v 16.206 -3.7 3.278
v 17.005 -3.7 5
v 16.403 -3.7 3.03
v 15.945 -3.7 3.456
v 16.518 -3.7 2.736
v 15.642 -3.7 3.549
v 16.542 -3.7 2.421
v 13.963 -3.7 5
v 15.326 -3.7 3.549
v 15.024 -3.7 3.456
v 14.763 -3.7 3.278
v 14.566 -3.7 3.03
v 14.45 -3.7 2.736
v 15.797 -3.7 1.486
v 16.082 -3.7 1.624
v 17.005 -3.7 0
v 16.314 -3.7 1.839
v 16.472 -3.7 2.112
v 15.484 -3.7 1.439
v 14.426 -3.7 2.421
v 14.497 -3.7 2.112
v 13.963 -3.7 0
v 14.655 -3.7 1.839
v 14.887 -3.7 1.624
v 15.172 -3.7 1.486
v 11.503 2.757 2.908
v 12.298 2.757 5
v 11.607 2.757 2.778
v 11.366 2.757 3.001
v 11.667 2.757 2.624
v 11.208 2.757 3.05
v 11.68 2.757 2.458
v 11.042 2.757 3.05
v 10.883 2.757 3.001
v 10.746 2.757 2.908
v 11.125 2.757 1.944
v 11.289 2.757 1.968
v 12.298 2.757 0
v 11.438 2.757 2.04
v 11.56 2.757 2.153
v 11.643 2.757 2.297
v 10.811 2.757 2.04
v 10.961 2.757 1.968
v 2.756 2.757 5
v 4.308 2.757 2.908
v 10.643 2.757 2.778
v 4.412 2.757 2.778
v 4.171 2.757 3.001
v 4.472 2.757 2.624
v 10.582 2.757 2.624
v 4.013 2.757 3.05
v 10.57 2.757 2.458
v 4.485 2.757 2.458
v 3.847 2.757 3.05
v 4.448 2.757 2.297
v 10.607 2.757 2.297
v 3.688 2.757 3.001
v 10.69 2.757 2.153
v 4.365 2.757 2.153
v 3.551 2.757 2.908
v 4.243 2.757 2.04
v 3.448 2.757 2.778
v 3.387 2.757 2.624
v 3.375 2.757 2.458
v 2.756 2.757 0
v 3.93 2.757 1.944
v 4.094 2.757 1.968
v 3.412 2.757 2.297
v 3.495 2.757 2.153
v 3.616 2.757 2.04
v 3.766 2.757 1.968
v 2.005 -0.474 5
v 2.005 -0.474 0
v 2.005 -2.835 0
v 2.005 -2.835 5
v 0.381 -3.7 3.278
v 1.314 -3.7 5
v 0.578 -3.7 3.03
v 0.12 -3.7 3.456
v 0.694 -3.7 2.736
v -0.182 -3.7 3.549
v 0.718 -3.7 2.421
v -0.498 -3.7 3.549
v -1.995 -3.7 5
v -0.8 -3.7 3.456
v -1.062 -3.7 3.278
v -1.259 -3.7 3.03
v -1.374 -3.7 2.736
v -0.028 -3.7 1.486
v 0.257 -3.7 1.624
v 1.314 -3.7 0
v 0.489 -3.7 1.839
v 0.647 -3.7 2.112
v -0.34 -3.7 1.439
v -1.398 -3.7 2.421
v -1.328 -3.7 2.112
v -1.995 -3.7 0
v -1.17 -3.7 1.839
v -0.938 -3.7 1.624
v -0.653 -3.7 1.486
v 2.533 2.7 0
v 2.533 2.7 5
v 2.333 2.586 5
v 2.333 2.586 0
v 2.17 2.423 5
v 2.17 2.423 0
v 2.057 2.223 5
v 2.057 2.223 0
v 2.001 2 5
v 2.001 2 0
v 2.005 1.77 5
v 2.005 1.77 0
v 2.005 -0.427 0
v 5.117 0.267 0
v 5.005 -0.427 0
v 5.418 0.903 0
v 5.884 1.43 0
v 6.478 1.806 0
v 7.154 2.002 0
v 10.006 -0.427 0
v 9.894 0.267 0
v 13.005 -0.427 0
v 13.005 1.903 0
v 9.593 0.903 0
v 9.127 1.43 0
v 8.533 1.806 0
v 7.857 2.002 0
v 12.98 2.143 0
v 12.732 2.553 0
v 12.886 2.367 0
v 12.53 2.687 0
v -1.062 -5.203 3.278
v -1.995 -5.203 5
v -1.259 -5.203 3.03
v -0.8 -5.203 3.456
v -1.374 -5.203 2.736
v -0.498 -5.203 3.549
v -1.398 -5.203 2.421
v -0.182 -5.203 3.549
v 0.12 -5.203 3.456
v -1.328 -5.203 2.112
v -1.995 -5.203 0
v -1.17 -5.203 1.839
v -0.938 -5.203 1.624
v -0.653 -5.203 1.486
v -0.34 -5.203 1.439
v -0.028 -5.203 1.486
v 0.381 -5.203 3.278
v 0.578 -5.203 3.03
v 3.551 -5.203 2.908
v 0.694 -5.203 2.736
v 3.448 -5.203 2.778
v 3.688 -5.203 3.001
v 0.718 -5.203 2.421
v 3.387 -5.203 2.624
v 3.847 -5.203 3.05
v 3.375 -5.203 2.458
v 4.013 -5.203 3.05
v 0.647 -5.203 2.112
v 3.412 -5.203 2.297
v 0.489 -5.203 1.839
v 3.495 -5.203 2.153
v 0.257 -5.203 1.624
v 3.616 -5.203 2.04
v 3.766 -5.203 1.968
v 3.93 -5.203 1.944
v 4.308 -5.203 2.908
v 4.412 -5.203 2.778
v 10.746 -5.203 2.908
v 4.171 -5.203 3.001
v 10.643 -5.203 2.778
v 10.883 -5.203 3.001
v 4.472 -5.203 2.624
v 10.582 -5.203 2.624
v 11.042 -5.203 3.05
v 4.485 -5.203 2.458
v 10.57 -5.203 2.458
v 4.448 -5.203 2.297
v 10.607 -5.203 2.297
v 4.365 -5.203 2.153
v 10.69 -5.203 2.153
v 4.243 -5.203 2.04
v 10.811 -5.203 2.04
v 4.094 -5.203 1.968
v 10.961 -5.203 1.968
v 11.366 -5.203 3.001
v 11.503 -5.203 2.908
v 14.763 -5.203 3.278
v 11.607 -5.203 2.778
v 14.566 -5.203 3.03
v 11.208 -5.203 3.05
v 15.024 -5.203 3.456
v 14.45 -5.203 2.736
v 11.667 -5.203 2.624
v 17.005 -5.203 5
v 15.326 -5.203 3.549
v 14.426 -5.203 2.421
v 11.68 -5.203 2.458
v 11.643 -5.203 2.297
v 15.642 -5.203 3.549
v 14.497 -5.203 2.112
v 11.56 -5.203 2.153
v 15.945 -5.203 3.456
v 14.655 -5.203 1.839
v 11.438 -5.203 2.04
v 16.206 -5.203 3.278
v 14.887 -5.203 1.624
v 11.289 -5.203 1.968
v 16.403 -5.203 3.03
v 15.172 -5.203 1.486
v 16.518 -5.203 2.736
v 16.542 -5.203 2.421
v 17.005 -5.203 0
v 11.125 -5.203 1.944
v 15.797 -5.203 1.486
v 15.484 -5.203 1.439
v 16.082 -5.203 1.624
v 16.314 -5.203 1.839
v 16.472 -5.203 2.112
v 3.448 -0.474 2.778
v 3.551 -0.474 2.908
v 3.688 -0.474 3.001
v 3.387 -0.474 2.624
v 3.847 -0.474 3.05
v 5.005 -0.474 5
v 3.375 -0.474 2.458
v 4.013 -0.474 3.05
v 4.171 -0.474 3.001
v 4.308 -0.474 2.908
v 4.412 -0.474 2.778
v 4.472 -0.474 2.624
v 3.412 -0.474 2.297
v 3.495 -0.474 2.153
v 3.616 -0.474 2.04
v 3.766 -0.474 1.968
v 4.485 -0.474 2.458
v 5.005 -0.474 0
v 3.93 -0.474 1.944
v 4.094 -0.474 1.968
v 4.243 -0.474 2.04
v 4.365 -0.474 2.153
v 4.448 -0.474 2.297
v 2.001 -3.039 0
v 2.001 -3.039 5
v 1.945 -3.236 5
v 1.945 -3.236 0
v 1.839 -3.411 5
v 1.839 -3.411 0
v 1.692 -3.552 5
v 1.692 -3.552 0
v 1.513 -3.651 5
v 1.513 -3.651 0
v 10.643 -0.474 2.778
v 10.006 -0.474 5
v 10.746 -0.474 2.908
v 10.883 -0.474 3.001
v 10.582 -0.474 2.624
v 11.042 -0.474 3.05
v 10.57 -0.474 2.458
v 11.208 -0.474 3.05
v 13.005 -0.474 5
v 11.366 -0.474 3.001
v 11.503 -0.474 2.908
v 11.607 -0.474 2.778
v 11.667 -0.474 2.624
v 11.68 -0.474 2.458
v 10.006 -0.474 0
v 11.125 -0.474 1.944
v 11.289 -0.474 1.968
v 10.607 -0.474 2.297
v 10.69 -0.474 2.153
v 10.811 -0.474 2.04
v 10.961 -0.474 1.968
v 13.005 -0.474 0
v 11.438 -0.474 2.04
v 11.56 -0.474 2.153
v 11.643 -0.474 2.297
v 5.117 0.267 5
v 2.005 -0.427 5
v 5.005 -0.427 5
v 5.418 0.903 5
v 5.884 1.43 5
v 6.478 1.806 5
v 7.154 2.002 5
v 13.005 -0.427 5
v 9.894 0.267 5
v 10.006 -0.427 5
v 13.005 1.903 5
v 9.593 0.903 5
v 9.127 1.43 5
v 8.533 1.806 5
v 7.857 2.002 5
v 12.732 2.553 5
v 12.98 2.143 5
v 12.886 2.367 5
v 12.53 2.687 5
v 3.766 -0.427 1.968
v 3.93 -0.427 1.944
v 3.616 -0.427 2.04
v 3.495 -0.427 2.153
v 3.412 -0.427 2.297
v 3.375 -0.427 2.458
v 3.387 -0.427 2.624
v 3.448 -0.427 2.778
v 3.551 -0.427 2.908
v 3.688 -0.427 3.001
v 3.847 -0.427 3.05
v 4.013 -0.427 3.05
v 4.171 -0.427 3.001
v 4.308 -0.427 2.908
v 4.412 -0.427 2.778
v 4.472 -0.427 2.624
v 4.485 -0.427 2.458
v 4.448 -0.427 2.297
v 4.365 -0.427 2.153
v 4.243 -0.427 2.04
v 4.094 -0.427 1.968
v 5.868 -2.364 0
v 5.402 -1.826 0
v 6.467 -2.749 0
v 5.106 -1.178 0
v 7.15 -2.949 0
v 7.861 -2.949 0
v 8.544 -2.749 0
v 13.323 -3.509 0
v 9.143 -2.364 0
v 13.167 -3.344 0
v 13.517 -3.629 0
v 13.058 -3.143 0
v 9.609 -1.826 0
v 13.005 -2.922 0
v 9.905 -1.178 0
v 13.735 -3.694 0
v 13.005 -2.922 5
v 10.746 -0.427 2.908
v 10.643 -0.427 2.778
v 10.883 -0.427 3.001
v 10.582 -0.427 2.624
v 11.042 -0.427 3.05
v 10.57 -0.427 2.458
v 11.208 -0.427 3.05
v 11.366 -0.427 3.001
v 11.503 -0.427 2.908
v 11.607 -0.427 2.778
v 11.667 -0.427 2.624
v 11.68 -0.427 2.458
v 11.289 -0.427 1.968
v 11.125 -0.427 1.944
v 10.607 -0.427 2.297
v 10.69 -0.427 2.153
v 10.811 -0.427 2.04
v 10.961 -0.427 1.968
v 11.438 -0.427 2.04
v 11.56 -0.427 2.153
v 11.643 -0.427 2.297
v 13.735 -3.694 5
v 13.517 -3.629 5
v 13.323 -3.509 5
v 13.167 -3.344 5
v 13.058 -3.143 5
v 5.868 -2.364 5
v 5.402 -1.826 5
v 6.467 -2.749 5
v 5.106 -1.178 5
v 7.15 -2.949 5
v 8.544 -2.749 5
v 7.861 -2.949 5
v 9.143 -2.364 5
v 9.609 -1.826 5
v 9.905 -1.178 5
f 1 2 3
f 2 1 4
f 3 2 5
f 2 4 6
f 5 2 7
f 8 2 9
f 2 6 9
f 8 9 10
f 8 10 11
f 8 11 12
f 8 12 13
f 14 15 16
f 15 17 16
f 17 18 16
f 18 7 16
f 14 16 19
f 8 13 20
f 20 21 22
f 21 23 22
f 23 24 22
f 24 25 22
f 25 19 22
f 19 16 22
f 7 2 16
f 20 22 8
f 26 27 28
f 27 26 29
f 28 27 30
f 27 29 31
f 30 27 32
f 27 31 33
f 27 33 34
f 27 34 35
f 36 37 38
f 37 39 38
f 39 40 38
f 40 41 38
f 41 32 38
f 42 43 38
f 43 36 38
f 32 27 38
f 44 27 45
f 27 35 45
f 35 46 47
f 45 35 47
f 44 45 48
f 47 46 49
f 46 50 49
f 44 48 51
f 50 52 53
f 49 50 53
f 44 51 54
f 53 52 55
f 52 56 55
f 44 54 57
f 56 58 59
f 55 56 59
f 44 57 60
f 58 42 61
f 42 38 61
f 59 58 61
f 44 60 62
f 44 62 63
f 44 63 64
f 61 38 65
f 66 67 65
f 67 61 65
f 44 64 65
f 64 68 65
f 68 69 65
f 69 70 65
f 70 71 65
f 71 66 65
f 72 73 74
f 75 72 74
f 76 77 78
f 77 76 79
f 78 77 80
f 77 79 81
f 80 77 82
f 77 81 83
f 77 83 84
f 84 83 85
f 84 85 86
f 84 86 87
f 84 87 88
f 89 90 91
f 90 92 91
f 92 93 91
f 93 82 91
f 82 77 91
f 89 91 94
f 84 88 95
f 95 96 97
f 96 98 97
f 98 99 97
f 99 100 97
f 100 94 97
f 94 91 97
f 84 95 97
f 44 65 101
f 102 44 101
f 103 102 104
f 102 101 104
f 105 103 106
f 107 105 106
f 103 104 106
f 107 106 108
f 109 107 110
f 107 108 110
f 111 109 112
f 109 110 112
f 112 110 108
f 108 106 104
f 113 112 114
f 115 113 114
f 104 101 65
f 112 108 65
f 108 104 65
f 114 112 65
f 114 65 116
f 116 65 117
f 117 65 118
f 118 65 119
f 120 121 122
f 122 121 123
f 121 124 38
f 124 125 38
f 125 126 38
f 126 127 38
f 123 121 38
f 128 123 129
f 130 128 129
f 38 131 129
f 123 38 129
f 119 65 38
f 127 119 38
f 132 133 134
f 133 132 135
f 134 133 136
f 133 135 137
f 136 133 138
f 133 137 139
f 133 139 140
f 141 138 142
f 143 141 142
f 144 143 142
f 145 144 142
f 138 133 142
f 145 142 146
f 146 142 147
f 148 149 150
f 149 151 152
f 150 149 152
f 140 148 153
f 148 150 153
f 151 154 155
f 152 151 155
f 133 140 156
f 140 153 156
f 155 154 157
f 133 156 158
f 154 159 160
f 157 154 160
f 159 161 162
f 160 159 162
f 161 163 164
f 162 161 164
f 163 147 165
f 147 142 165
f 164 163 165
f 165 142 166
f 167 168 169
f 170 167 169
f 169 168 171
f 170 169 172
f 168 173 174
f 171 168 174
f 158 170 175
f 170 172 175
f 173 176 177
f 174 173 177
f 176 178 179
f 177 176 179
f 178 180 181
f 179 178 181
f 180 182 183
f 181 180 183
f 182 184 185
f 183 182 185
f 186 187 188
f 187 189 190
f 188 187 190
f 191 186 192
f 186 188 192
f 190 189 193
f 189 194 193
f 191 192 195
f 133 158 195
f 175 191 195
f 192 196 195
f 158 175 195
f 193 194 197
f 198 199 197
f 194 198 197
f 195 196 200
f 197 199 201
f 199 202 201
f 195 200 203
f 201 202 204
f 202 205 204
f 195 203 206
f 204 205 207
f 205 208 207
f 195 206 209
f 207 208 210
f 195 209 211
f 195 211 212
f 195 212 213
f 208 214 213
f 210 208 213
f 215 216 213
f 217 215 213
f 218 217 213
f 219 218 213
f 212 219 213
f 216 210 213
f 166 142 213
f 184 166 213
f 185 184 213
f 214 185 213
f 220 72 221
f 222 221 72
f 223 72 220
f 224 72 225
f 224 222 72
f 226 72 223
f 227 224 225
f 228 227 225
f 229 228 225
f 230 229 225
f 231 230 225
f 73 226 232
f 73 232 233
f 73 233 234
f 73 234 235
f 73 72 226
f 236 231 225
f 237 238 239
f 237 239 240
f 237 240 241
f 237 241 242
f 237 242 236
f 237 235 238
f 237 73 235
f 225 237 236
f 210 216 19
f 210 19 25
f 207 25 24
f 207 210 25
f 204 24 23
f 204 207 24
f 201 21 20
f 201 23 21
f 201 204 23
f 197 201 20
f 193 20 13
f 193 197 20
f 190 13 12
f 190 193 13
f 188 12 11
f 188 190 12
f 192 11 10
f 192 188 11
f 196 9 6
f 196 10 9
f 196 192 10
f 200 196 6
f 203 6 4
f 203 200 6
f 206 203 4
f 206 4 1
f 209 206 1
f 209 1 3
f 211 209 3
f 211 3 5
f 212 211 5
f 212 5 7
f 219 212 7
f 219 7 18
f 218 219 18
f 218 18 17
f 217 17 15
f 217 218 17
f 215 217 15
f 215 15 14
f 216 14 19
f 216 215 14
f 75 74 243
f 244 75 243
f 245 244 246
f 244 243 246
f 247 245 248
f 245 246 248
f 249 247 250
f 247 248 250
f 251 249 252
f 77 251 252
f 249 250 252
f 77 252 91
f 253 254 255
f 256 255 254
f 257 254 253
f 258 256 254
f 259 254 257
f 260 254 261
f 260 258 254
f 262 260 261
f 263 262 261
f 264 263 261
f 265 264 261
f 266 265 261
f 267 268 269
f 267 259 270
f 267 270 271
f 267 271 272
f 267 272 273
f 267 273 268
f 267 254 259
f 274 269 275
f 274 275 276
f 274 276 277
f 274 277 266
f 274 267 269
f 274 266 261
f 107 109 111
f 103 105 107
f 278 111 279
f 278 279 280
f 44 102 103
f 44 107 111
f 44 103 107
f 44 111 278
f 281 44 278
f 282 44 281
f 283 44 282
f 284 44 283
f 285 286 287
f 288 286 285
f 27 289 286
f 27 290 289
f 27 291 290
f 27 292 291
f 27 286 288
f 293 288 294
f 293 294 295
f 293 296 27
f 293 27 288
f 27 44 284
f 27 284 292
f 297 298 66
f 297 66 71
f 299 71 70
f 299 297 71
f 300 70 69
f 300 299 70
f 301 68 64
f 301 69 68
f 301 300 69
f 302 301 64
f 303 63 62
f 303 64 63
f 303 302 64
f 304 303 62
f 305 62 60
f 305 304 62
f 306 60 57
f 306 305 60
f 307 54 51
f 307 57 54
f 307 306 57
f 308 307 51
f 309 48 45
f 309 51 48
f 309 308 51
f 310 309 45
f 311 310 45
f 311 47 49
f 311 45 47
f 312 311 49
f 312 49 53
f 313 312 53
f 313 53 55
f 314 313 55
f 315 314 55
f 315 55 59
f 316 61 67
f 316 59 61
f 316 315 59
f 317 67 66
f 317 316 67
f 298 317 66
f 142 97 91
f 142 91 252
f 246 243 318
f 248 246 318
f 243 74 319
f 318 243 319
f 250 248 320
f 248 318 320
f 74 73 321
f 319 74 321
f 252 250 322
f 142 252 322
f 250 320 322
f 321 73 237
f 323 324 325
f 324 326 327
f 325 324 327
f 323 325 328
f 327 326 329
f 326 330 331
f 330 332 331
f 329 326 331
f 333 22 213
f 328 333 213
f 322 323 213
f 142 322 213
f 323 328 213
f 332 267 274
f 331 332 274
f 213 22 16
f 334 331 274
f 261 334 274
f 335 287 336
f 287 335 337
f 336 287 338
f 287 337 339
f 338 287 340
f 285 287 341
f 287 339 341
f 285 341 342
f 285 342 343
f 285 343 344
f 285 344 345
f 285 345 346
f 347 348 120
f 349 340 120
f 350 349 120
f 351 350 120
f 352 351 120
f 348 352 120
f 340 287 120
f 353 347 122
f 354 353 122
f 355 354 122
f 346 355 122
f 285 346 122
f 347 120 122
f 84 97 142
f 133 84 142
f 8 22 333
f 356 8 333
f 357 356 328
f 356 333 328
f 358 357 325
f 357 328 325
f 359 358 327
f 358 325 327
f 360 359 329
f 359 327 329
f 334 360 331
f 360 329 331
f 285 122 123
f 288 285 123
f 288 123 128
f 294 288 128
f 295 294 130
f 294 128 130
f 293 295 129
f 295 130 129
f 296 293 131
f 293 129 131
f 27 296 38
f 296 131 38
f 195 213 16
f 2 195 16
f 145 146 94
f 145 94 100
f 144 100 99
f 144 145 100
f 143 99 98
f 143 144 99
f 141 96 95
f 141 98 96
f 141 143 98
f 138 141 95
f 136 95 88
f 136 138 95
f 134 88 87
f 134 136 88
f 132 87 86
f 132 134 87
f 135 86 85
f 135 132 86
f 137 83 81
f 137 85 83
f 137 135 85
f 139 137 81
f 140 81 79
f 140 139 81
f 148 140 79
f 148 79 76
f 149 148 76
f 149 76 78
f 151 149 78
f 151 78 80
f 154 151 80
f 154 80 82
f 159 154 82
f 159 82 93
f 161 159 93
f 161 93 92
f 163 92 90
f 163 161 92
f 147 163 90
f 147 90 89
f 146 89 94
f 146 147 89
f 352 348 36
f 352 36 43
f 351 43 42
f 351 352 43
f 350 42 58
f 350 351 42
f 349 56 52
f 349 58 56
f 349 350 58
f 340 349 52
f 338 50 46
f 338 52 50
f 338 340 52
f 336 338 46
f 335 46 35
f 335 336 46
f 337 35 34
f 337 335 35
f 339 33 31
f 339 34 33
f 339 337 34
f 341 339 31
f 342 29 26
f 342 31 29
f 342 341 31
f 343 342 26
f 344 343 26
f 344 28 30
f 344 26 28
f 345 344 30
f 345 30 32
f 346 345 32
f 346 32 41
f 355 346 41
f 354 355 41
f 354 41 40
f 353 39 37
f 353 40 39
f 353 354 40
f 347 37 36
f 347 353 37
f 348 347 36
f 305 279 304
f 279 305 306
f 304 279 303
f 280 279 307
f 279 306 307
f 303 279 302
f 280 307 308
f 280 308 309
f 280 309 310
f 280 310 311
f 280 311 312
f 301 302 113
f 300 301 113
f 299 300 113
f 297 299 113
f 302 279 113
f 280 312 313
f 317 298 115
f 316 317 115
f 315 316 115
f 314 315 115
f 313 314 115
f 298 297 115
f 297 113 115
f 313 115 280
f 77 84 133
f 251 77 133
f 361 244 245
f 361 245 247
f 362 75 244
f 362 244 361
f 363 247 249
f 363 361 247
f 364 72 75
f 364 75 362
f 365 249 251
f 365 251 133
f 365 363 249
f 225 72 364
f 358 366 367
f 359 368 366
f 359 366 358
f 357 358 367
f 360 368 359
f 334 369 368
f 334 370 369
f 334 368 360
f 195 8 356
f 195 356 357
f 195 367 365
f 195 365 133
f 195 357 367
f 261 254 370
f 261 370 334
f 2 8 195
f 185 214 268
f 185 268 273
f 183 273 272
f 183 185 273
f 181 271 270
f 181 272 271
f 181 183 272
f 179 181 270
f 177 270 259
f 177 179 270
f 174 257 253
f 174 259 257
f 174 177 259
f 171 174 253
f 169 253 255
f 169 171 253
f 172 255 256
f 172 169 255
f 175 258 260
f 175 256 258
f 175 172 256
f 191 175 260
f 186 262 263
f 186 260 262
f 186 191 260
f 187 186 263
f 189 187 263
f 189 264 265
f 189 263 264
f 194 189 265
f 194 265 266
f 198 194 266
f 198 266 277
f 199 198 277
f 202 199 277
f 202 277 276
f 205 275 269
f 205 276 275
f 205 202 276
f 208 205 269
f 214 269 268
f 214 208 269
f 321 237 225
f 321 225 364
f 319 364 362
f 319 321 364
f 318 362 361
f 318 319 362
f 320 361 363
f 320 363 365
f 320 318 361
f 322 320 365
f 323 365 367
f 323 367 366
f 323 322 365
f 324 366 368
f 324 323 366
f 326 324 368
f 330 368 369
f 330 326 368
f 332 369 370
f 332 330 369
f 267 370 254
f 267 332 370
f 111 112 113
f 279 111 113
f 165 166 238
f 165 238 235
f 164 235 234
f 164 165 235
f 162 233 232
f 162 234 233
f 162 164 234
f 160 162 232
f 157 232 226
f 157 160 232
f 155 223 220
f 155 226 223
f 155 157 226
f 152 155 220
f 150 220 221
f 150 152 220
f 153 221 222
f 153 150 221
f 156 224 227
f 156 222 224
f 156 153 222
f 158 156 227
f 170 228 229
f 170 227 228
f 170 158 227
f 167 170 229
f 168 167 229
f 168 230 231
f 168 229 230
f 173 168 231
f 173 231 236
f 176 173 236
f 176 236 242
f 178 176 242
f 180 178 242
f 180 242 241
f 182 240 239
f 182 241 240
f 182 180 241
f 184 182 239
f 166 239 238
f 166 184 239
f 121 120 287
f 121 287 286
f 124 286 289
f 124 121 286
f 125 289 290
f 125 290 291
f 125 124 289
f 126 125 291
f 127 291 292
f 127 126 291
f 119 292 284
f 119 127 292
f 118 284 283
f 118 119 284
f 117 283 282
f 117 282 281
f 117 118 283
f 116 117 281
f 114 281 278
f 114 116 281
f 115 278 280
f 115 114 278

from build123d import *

# Parameters (mm, degrees)
ESBO_O1_R                  = 2.500659113
RESSALTO_EXTRUS_O1_DEPTH   = 5
CORTE_EXTRUS_O1_DEPTH      = 7
CORTE_EXTRUS_O1_DEPTH_BACK = 3
ESBO_O2_W                  = 15.499945442
ESBO_O2_H                  = 0.046559987
CORTE_EXTRUS_O2_DEPTH      = 1
CORTE_EXTRUS_O2_DEPTH_BACK = 2
ESBO_O3_R                  = 1.060761411
CORTE_EXTRUS_O3_DEPTH      = 1
CORTE_EXTRUS_O3_DEPTH_BACK = 9
ESBO_O4_R                  = 0.55636465


with BuildPart() as part:
    # Esboço1 → Ressalto-extrusão1 (new body)
    with BuildSketch(Plane.XY):
        with BuildLine():
            Line((-1.994581442, -5.203341468), (17.005418558, -5.203341468))
            Line((17.005418558, -5.203341468), (17.005418558, -3.700160989))
            Line((17.005418558, -3.700160989), (13.96315408, -3.700160989))
            ThreePointArc((13.96315408, -3.700160989), (13.323065801, -3.509293749), (13.005418558, -2.921719466))
            Line((13.005418558, -2.921719466), (13.005418558, 1.902771573))
            ThreePointArc((13.005418558, 1.902771573), (12.81558044, 2.465418863), (12.298336044, 2.757084288))
            Line((12.298336044, 2.757084288), (2.755939614, 2.757084288))
            ThreePointArc((2.755939614, 2.757084288), (2.170476224, 2.423277661), (2.005418558, 1.769863388))
            Line((2.005418558, 1.769863388), (2.005418558, -2.834609505))
            ThreePointArc((2.005418558, -2.834609505), (1.839014359, -3.410564702), (1.314086996, -3.700160989))
            Line((1.314086996, -3.700160989), (-1.994581442, -3.700160989))
            Line((-1.994581442, -3.700160989), (-1.994581442, -5.203341468))
        make_face()
        with Locations((7.505418558, -0.473834048)):
            Circle(ESBO_O1_R, mode=Mode.SUBTRACT)
    extrude(amount=RESSALTO_EXTRUS_O1_DEPTH)

    # Esboço2 → Corte-extrusão1 (cut, two sides: drawn at the far end of the back side and taken through both)
    with BuildSketch(Plane.XY.offset(-CORTE_EXTRUS_O1_DEPTH_BACK)):
        with Locations((7.749972721, -0.450554055)):
            Rectangle(ESBO_O2_W, ESBO_O2_H)
    extrude(amount=CORTE_EXTRUS_O1_DEPTH + CORTE_EXTRUS_O1_DEPTH_BACK, mode=Mode.SUBTRACT)


with BuildPart() as corte_extrus_o1_piece_1:
    # of the separate pieces the step leaves, piece 1, a body of its own (corte_extrus_o1_pieces)
    add(part.part.solids().sort_by_distance((2.005418558, -0.473834048, 0))[0])

    # Esboço3 → Corte-extrusão2 (cut, two sides: drawn at the far end of the back side and taken through both)
    with BuildSketch(Plane(origin=(0, -3.700160989, 0), x_dir=(1, 0, 0), z_dir=(0, 1, 0)).offset(-CORTE_EXTRUS_O2_DEPTH_BACK)):
        with Locations((15.484286319, -2.5)):
            Circle(ESBO_O3_R)
        with Locations((-0.340247223, -2.5)):
            Circle(ESBO_O3_R)
    extrude(amount=CORTE_EXTRUS_O2_DEPTH + CORTE_EXTRUS_O2_DEPTH_BACK, mode=Mode.SUBTRACT)


with BuildPart() as corte_extrus_o1_piece_2:
    # of the separate pieces the step leaves, piece 2, a body of its own (corte_extrus_o1_pieces)
    add(part.part.solids().sort_by_distance((2.005418558, 1.769863388, 0))[0])


with BuildPart() as corte_extrus_o3_tool:
    # Esboço4 → Corte-extrusão3 (new, two sides: drawn at the far end of the back side and taken through both)
    with BuildSketch(Plane(origin=(0, 2.757084288, 0), x_dir=(1, 0, 0), z_dir=(0, 1, 0)).offset(-CORTE_EXTRUS_O3_DEPTH_BACK)):
        with Locations((3.929895865, -2.5)):
            Circle(ESBO_O4_R)
        with Locations((11.12481326, -2.5)):
            Circle(ESBO_O4_R)
    extrude(amount=CORTE_EXTRUS_O3_DEPTH + CORTE_EXTRUS_O3_DEPTH_BACK)


with BuildPart() as corte_extrus_o1_piece_1_1:
    add(corte_extrus_o1_piece_1.part)

    # Corte-extrusão3: cut by corte_extrus_o3_tool
    add(corte_extrus_o3_tool.part, mode=Mode.SUBTRACT)


with BuildPart() as corte_extrus_o1_piece_2_1:
    add(corte_extrus_o1_piece_2.part)

    # Corte-extrusão3: cut by corte_extrus_o3_tool
    add(corte_extrus_o3_tool.part, mode=Mode.SUBTRACT)


solid = Compound([corte_extrus_o1_piece_1_1.part, corte_extrus_o1_piece_2_1.part])
